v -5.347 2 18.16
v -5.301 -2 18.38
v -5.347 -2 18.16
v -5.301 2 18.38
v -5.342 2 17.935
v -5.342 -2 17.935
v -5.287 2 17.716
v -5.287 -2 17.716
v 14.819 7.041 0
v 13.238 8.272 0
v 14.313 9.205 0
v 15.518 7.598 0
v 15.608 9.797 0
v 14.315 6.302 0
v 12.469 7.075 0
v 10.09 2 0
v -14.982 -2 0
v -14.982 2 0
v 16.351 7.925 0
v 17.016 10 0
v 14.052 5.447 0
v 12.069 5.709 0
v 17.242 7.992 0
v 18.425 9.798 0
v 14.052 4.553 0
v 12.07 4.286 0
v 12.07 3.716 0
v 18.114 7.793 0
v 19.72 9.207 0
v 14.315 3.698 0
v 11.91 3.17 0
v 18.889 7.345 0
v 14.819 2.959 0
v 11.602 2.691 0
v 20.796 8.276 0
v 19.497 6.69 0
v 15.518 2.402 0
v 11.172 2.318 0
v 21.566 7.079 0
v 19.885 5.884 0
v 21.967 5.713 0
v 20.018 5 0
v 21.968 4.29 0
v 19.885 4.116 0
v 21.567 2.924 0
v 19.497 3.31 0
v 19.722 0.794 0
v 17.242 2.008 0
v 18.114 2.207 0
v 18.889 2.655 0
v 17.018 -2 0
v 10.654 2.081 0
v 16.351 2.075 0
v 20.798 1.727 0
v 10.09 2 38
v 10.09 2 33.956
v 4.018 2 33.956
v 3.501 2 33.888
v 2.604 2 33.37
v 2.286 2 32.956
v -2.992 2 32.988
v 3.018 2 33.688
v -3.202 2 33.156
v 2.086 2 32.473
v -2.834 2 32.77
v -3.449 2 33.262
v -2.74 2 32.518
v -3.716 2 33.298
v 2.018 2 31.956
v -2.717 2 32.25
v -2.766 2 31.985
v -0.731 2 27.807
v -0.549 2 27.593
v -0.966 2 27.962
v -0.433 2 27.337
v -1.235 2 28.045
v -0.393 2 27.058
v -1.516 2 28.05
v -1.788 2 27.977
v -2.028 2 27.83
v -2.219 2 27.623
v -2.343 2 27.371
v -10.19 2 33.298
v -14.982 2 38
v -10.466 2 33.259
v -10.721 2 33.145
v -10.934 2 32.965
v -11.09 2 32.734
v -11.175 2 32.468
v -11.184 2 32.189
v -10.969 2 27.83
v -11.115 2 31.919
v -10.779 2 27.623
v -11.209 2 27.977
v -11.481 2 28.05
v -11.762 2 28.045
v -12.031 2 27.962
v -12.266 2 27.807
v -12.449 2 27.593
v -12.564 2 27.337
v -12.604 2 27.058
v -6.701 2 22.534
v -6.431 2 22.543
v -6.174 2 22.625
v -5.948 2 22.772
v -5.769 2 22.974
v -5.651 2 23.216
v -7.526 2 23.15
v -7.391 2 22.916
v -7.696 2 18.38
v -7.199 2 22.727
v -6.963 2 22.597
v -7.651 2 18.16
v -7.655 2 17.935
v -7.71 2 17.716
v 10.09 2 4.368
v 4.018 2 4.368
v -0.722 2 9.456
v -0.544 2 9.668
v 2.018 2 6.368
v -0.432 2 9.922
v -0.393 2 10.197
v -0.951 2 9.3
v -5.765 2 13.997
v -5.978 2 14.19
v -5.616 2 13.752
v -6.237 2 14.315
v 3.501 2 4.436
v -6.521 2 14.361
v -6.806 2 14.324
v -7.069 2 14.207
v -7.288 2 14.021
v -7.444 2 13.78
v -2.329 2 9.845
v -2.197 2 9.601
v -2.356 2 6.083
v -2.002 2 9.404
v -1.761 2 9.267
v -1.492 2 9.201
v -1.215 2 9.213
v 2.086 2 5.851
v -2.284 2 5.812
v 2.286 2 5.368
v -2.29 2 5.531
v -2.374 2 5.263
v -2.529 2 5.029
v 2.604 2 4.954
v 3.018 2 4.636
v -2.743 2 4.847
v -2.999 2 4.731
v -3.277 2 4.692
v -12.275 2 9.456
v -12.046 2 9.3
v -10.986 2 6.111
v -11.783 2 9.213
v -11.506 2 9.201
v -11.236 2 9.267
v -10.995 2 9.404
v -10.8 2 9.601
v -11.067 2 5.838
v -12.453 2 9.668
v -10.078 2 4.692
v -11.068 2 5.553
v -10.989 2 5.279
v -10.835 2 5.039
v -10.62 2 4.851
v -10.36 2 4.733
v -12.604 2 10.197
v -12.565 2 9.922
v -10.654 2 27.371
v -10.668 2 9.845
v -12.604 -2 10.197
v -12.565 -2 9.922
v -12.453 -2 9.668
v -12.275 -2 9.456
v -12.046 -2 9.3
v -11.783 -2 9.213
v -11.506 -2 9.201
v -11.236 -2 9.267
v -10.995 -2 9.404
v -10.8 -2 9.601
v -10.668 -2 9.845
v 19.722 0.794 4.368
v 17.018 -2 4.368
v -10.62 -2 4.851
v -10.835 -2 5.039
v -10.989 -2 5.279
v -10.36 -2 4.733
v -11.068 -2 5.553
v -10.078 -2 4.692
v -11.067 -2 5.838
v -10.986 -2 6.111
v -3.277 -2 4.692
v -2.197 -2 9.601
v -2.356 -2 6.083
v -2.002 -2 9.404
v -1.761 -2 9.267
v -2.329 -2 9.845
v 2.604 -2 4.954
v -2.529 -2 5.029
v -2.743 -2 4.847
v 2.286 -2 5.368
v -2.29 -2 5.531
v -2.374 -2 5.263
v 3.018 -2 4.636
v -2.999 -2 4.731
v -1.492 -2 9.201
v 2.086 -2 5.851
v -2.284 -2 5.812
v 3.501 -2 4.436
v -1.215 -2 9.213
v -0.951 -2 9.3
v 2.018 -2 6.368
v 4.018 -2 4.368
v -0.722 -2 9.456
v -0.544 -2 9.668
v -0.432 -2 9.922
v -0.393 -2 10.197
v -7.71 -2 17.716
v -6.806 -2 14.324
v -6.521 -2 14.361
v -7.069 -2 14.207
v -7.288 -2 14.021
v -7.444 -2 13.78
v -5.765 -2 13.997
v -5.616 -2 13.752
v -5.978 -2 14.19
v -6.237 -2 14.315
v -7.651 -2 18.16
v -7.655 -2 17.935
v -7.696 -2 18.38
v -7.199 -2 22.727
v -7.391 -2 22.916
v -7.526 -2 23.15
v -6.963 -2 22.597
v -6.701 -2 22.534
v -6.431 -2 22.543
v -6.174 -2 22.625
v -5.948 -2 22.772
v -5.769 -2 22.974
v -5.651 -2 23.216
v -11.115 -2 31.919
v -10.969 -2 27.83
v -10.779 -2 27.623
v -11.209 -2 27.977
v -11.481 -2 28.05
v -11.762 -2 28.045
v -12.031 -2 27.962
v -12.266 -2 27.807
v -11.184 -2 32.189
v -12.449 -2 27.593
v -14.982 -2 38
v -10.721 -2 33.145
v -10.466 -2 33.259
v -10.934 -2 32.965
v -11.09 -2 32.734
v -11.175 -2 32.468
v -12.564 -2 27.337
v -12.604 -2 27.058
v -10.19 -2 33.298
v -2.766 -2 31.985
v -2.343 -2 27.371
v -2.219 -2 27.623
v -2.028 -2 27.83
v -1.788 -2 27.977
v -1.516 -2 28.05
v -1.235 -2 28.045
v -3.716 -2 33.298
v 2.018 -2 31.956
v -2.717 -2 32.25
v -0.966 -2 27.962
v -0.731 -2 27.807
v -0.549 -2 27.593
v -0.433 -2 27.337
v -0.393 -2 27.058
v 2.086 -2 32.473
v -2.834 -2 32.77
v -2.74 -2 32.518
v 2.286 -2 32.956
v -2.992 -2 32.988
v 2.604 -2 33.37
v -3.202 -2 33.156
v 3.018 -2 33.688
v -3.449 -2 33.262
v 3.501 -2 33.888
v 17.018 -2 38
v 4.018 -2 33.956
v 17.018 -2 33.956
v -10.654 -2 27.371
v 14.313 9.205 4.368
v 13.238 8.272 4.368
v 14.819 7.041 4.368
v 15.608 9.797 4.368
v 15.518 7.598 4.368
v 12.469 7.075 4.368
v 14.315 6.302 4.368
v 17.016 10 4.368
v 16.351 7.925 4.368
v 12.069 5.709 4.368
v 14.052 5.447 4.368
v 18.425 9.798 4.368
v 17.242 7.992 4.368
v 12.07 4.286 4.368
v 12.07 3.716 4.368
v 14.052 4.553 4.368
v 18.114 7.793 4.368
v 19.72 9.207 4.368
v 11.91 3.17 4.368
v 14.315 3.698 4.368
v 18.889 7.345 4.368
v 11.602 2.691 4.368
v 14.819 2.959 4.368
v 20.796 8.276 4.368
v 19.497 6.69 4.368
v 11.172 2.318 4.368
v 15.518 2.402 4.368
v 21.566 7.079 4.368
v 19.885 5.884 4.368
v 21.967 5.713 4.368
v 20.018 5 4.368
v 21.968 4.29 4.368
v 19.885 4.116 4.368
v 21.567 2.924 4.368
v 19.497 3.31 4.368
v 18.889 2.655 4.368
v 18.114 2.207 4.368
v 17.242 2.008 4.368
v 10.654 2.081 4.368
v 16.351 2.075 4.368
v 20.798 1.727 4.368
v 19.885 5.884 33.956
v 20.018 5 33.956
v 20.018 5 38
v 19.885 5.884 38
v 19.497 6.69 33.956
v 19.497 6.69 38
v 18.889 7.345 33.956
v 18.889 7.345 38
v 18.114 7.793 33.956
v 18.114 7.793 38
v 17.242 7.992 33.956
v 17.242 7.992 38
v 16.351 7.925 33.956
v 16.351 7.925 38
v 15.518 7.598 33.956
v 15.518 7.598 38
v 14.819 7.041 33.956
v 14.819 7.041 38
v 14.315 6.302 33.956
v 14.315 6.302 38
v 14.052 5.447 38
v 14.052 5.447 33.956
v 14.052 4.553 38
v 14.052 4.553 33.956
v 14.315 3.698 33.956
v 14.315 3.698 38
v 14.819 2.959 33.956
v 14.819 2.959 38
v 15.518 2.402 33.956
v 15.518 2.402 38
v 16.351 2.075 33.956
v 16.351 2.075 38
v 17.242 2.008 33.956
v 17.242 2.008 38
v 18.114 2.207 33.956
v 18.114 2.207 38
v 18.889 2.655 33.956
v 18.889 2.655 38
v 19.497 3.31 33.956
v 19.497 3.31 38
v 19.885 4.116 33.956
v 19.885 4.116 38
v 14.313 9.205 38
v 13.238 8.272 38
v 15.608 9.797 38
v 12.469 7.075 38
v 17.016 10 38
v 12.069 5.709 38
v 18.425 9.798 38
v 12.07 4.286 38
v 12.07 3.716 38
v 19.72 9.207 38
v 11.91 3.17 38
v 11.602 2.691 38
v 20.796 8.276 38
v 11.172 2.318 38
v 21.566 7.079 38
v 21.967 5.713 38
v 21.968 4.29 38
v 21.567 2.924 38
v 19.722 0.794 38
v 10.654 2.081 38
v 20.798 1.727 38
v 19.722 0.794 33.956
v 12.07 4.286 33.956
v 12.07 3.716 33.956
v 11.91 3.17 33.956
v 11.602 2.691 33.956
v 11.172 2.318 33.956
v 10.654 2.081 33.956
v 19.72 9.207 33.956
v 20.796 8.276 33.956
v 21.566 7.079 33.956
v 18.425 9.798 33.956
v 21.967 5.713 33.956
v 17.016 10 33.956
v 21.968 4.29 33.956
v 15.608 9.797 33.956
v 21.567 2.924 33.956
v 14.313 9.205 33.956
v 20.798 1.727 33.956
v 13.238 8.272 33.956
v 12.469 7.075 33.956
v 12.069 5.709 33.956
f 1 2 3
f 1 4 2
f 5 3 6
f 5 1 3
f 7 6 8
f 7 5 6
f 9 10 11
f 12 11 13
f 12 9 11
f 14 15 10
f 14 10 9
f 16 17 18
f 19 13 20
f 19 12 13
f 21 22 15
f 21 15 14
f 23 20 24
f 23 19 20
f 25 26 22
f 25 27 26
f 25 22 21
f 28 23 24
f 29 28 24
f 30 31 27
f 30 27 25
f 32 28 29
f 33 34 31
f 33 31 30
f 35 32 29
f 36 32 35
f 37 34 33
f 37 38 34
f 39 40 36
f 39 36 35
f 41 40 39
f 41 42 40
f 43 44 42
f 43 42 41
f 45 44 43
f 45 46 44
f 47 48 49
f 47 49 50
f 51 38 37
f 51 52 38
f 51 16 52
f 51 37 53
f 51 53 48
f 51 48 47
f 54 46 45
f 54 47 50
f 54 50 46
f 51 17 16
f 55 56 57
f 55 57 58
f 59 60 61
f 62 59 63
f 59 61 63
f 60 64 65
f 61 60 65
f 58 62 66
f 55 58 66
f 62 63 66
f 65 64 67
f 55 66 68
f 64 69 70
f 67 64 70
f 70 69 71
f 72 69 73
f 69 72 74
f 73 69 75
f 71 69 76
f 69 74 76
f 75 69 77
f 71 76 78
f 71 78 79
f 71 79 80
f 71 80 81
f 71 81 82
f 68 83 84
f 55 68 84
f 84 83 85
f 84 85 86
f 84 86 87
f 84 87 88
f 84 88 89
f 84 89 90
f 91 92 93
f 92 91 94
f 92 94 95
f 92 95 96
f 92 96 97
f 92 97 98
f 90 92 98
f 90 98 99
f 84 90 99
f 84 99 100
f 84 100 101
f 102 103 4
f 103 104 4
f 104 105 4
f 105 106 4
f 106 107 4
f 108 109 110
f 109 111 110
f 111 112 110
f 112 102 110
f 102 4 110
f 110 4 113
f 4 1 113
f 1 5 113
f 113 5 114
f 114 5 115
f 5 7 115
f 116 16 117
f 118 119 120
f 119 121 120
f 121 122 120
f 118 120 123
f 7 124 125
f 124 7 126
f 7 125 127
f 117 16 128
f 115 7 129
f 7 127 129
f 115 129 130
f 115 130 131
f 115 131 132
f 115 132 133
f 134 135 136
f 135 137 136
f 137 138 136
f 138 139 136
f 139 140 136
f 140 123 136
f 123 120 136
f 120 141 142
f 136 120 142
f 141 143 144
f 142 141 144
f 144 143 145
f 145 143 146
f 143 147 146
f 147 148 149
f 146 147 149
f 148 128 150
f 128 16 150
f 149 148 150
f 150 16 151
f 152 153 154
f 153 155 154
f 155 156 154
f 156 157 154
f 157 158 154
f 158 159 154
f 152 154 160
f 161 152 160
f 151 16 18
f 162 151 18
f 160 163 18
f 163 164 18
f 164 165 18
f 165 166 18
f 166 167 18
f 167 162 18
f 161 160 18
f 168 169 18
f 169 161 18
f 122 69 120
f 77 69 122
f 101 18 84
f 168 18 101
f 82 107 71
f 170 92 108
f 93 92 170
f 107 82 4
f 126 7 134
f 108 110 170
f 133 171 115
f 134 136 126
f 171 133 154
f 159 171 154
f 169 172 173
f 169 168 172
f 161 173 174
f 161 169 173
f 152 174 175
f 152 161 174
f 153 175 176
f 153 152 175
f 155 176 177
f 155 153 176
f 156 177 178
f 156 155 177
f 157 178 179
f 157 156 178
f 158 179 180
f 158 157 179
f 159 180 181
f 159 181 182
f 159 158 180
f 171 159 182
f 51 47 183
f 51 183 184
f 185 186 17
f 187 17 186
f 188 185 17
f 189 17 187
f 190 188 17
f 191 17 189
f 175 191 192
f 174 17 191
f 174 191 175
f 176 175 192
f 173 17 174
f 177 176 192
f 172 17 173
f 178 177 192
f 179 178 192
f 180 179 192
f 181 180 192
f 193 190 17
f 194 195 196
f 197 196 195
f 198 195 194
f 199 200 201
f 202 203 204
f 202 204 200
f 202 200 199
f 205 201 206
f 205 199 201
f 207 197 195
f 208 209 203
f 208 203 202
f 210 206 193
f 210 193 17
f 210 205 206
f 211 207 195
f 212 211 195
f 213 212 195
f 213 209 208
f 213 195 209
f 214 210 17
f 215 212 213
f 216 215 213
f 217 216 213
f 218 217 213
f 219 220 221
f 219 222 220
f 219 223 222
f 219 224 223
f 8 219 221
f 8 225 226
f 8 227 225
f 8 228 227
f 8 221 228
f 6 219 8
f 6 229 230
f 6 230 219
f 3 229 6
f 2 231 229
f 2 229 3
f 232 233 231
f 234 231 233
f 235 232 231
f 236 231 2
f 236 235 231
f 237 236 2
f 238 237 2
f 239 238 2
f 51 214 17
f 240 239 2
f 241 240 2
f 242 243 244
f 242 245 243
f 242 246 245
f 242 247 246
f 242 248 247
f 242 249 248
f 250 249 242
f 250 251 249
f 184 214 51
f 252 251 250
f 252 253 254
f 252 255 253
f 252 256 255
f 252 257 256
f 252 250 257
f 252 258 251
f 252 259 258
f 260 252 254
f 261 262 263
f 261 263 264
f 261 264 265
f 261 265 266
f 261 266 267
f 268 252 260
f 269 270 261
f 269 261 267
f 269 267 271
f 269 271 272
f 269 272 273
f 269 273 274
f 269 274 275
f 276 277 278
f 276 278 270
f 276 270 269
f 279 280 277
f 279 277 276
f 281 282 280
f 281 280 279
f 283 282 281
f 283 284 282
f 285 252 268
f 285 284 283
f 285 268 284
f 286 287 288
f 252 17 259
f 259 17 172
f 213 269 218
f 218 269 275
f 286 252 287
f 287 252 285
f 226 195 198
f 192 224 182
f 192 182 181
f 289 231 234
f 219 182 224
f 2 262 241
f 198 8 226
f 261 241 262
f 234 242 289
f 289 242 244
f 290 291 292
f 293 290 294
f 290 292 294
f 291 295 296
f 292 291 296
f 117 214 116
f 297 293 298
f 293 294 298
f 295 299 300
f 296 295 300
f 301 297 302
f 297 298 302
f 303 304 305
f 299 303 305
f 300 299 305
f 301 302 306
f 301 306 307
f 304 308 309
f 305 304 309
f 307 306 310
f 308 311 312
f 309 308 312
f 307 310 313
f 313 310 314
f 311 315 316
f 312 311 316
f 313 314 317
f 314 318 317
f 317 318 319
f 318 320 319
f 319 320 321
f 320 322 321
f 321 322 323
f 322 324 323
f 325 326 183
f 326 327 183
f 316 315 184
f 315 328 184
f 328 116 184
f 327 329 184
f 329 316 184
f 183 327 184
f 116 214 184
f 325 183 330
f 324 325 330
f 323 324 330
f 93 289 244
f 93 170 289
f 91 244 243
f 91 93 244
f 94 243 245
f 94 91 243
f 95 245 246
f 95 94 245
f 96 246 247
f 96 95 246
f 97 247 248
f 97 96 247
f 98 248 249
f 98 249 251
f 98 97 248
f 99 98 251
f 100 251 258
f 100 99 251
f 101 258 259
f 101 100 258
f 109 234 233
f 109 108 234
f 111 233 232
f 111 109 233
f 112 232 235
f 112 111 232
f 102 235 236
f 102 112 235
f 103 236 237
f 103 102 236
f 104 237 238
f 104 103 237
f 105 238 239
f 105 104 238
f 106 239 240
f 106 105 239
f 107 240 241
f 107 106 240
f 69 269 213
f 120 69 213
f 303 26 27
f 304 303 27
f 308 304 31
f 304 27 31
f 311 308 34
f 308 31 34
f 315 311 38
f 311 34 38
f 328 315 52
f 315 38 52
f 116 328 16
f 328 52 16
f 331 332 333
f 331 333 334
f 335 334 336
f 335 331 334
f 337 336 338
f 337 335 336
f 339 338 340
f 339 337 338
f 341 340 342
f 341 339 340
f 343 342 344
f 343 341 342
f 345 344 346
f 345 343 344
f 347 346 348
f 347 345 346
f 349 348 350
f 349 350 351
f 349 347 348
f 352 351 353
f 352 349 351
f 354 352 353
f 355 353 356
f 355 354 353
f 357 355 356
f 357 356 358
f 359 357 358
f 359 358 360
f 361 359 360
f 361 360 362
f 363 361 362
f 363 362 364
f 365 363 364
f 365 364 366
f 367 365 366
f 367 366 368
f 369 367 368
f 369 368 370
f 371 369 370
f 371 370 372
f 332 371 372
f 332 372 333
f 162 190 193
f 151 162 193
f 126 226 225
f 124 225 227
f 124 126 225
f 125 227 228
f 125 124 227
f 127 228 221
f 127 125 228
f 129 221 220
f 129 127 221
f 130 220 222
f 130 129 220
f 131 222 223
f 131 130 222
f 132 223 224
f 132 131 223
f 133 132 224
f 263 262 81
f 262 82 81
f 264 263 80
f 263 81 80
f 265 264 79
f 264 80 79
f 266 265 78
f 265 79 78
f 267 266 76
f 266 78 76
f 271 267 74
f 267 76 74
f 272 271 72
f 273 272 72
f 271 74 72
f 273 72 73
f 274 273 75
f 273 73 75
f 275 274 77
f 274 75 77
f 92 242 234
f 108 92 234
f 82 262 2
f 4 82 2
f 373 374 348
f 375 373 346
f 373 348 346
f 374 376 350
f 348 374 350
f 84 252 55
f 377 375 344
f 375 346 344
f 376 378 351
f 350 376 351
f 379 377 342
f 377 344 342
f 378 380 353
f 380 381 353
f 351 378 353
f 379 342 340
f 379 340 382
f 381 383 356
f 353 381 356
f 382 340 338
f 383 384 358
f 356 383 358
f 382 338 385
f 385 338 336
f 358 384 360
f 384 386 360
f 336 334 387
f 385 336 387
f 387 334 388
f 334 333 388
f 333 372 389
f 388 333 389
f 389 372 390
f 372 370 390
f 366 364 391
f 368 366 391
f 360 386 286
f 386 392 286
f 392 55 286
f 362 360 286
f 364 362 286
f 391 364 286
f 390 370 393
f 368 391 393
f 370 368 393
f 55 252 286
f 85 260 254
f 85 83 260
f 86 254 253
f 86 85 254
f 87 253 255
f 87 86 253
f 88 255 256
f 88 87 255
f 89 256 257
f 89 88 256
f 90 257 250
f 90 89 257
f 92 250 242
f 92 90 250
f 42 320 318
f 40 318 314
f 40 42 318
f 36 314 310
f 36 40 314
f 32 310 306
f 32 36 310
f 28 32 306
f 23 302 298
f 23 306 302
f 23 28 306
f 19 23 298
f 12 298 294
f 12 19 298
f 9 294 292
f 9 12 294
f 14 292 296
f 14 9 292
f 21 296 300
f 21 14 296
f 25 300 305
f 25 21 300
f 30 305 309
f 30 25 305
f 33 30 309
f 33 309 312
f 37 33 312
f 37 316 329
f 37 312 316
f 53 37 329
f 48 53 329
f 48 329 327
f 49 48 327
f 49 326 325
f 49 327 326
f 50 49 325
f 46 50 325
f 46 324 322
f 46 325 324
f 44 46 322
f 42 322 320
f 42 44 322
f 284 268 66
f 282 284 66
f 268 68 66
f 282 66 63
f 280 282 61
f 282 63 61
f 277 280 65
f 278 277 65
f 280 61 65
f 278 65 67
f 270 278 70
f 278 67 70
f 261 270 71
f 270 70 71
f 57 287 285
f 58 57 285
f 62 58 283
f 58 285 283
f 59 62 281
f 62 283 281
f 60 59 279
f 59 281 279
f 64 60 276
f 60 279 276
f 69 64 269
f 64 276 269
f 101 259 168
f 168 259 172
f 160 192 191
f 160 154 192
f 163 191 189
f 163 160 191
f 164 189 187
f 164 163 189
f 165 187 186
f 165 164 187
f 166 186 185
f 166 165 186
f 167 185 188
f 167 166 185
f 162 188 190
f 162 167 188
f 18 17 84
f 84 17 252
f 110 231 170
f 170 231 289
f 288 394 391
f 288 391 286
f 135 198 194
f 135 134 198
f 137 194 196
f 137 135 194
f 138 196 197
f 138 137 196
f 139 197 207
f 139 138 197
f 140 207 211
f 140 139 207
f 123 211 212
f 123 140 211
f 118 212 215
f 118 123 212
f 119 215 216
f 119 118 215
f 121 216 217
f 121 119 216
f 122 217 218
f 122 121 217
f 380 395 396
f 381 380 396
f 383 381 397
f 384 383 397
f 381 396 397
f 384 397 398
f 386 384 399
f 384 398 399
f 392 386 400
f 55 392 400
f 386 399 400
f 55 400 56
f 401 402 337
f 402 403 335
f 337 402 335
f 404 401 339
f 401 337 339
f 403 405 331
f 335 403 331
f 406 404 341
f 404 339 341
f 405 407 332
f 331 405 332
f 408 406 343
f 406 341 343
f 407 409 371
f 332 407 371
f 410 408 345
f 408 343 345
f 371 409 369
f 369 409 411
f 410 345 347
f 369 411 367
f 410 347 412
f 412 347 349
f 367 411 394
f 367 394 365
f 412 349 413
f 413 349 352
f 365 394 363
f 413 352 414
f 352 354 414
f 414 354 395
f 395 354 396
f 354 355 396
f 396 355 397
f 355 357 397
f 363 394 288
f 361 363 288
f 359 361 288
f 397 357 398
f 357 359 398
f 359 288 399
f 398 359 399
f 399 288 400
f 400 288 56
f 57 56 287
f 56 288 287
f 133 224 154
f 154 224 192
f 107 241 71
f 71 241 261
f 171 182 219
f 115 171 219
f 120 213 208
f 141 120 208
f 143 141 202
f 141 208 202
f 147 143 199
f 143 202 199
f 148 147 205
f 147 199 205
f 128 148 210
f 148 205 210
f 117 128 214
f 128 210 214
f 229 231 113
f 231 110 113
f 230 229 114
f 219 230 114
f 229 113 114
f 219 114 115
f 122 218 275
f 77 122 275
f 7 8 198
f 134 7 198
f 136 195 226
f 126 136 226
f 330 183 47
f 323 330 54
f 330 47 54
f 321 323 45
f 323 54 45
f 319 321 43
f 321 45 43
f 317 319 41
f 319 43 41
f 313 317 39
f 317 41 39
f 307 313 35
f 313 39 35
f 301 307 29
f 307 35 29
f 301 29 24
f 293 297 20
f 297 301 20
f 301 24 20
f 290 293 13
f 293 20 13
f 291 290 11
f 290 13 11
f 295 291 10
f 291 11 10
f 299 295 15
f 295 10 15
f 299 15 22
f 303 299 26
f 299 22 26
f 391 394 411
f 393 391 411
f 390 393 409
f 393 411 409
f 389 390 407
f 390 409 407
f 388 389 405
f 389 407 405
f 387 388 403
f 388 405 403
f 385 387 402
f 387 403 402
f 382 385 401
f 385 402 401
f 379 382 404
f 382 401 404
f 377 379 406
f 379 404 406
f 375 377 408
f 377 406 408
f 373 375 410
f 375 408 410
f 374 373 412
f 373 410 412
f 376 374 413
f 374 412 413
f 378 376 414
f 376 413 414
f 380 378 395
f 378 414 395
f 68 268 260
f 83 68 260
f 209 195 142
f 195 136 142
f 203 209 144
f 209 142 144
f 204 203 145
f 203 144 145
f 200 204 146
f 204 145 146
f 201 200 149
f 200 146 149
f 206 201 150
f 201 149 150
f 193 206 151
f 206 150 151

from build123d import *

# Parameters (mm, degrees)
F0_R      = 3
F1_DEPTH  = 38
F3_W      = 47.0337605621
F3_H      = 38
F4_DEPTH  = 2
F6_DEPTH  = 38
F7_DEPTH  = 12.5
F9_DEPTH  = 25
F10_R     = 1
F11_W     = 18.2646340574
F11_H     = 47.5416160189
F12_DEPTH = 25


with BuildPart() as f1:
    # F0 (on Top) → F1 (new body)
    with BuildSketch(Plane.XY):
        with BuildLine():
            Line((-30.015476048, 0), (17.0182845141, 0))
            ThreePointArc((17.0182845141, 0), (20.2915528676, 8.7796447301), (12.069567921, 4.2857142857))
            ThreePointArc((12.069567921, 4.2857142857), (11.6019391758, 2.6906926586), (10.0900812838, 2))
            Line((10.0900812838, 2), (-30.015476048, 2))
            Line((-30.015476048, 2), (-30.015476048, 0))
        make_face()
        with Locations((17.0182845141, 5)):
            Circle(F0_R, mode=Mode.SUBTRACT)
    extrude(amount=F1_DEPTH)

    # F3 (on face) → F4 (join)
    with BuildSketch(Plane.XZ):
        with Locations((-6.498595767, 19)):
            Rectangle(F3_W, F3_H)
    extrude(amount=F4_DEPTH)

    # F5 (on face) → F6 (join)
    with BuildSketch(Plane(origin=(0, 0, 0), x_dir=(1, 0, 0), z_dir=(0, 0, -1))):
        with BuildLine():
            Line((19.7223976995, -0.7943167166), (17.0182845141, 2))
            Line((17.0182845141, 2), (17.0182845141, 0))
            ThreePointArc((17.0182845141, 0), (18.4274657627, -0.2026873973), (19.7223976995, -0.7943167166))
        make_face()
    extrude(amount=-F6_DEPTH)

    # F2 (on face) → F7 (cut, symmetric)
    with BuildSketch(Plane.XZ):
        with BuildLine():
            Line((-16.9817154859, 33.5), (-30.015476048, 33.5))
            Line((-30.015476048, 33.5), (-30.015476048, 4.5))
            Line((-30.015476048, 4.5), (-16.9817154859, 4.5))
            ThreePointArc((-16.9817154859, 4.5), (-15.5675019236, 5.0857864376), (-14.9817154859, 6.5))
            Line((-14.9817154859, 6.5), (-14.9817154859, 31.5))
            ThreePointArc((-14.9817154859, 31.5), (-15.5675019236, 32.9142135624), (-16.9817154859, 33.5))
        make_face()
        with BuildLine():
            Line((38.1005785107, 4.3682365306), (38.1005785107, 33.9556627348))
            Line((38.1005785107, 33.9556627348), (4.0182845141, 33.9556627348))
            ThreePointArc((4.0182845141, 33.9556627348), (2.6040709517, 33.3698762972), (2.0182845141, 31.9556627348))
            Line((2.0182845141, 31.9556627348), (2.0182845141, 6.3682365306))
            ThreePointArc((2.0182845141, 6.3682365306), (2.6040709517, 4.9540229682), (4.0182845141, 4.3682365306))
            Line((4.0182845141, 4.3682365306), (38.1005785107, 4.3682365306))
        make_face()
    extrude(amount=F7_DEPTH, both=True, mode=Mode.SUBTRACT)

    # F8 (on face) → F9 (cut)
    with BuildSketch(Plane.XZ.offset(2)):
        Polygon((-7.5863441452, 18.0459246039), (-12.6038566232, 33.2977212965), (-12.6038566232, 4.6920240857), align=None)
        Polygon((-0.3933349107, 33.2977212965), (-5.4108473887, 18.0459246039), (-0.3933349107, 4.6920240857), align=None)
        Polygon((-2.3342688624, 33.2977212965), (-11.6795975956, 33.2977212965), (-6.498595767, 20.6393636763), align=None)
        Polygon((-1.7651436112, 4.6920240857), (-6.498595767, 15.827909112), (-11.6411998855, 4.6920240857), align=None)
    extrude(amount=-F9_DEPTH, mode=Mode.SUBTRACT)

    # F10
    f10_edges = [f1.edges().sort_by_distance(p)[0] for p in [
        (-11.679598, 0, 33.297721),
        (-2.334269, 0, 33.297721),
        (-12.603857, 0, 33.297721),
        (-12.603857, 0, 4.692024),
        (-7.586344, 0, 18.045925),
        (-6.498596, 0, 20.639364),
        (-0.393335, 0, 33.297721),
        (-5.410847, 0, 18.045925),
        (-0.393335, 0, 4.692024),
        (-6.498596, 0, 15.827909),
        (-1.765144, 0, 4.692024),
        (-11.6412, 0, 4.692024),
    ]]
    fillet(f10_edges, radius=F10_R)

    # F11 (on face) → F12 (cut)
    with BuildSketch(Plane.XZ.offset(2)):
        with Locations((-24.1140325146, 18.5290810186)):
            Rectangle(F11_W, F11_H)
    extrude(amount=-F12_DEPTH, mode=Mode.SUBTRACT)


solid = f1.part
